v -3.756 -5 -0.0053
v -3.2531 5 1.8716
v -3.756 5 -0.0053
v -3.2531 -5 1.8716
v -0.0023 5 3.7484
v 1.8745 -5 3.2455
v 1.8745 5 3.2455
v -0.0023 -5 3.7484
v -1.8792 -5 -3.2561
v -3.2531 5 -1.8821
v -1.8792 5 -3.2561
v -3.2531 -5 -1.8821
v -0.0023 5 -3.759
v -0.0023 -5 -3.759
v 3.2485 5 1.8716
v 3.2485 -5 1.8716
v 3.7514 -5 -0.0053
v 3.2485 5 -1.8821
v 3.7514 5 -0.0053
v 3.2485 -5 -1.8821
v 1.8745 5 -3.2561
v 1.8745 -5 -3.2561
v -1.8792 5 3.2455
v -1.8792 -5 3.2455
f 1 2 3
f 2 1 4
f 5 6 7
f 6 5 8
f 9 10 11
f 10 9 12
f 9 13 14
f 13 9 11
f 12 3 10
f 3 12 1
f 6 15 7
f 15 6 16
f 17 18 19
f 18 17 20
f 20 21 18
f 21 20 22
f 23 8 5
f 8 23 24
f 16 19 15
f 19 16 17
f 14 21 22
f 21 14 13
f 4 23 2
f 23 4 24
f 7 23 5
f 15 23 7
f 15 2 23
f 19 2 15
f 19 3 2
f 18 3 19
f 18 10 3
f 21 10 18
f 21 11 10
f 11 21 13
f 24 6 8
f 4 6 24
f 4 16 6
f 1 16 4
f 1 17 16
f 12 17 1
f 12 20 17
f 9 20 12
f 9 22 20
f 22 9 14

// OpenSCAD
// Begin.
union() {
rotate([0, -0, 90])
translate([-5.00679e-06, 0.00231, -0.00529])
rotate([0, 90, 0])
cylinder(h = 10, r1 = 3.7537, r2 = 3.7537, center = true, $fn = 12);

rotate([0, -0, 90])
translate([-5.00679e-06, 0.00231, -0.00529])
rotate([0, 90, 0])
cylinder(h = 10, r1 = 3.7537, r2 = 3.7537, center = true, $fn = 12);
}
// End.
